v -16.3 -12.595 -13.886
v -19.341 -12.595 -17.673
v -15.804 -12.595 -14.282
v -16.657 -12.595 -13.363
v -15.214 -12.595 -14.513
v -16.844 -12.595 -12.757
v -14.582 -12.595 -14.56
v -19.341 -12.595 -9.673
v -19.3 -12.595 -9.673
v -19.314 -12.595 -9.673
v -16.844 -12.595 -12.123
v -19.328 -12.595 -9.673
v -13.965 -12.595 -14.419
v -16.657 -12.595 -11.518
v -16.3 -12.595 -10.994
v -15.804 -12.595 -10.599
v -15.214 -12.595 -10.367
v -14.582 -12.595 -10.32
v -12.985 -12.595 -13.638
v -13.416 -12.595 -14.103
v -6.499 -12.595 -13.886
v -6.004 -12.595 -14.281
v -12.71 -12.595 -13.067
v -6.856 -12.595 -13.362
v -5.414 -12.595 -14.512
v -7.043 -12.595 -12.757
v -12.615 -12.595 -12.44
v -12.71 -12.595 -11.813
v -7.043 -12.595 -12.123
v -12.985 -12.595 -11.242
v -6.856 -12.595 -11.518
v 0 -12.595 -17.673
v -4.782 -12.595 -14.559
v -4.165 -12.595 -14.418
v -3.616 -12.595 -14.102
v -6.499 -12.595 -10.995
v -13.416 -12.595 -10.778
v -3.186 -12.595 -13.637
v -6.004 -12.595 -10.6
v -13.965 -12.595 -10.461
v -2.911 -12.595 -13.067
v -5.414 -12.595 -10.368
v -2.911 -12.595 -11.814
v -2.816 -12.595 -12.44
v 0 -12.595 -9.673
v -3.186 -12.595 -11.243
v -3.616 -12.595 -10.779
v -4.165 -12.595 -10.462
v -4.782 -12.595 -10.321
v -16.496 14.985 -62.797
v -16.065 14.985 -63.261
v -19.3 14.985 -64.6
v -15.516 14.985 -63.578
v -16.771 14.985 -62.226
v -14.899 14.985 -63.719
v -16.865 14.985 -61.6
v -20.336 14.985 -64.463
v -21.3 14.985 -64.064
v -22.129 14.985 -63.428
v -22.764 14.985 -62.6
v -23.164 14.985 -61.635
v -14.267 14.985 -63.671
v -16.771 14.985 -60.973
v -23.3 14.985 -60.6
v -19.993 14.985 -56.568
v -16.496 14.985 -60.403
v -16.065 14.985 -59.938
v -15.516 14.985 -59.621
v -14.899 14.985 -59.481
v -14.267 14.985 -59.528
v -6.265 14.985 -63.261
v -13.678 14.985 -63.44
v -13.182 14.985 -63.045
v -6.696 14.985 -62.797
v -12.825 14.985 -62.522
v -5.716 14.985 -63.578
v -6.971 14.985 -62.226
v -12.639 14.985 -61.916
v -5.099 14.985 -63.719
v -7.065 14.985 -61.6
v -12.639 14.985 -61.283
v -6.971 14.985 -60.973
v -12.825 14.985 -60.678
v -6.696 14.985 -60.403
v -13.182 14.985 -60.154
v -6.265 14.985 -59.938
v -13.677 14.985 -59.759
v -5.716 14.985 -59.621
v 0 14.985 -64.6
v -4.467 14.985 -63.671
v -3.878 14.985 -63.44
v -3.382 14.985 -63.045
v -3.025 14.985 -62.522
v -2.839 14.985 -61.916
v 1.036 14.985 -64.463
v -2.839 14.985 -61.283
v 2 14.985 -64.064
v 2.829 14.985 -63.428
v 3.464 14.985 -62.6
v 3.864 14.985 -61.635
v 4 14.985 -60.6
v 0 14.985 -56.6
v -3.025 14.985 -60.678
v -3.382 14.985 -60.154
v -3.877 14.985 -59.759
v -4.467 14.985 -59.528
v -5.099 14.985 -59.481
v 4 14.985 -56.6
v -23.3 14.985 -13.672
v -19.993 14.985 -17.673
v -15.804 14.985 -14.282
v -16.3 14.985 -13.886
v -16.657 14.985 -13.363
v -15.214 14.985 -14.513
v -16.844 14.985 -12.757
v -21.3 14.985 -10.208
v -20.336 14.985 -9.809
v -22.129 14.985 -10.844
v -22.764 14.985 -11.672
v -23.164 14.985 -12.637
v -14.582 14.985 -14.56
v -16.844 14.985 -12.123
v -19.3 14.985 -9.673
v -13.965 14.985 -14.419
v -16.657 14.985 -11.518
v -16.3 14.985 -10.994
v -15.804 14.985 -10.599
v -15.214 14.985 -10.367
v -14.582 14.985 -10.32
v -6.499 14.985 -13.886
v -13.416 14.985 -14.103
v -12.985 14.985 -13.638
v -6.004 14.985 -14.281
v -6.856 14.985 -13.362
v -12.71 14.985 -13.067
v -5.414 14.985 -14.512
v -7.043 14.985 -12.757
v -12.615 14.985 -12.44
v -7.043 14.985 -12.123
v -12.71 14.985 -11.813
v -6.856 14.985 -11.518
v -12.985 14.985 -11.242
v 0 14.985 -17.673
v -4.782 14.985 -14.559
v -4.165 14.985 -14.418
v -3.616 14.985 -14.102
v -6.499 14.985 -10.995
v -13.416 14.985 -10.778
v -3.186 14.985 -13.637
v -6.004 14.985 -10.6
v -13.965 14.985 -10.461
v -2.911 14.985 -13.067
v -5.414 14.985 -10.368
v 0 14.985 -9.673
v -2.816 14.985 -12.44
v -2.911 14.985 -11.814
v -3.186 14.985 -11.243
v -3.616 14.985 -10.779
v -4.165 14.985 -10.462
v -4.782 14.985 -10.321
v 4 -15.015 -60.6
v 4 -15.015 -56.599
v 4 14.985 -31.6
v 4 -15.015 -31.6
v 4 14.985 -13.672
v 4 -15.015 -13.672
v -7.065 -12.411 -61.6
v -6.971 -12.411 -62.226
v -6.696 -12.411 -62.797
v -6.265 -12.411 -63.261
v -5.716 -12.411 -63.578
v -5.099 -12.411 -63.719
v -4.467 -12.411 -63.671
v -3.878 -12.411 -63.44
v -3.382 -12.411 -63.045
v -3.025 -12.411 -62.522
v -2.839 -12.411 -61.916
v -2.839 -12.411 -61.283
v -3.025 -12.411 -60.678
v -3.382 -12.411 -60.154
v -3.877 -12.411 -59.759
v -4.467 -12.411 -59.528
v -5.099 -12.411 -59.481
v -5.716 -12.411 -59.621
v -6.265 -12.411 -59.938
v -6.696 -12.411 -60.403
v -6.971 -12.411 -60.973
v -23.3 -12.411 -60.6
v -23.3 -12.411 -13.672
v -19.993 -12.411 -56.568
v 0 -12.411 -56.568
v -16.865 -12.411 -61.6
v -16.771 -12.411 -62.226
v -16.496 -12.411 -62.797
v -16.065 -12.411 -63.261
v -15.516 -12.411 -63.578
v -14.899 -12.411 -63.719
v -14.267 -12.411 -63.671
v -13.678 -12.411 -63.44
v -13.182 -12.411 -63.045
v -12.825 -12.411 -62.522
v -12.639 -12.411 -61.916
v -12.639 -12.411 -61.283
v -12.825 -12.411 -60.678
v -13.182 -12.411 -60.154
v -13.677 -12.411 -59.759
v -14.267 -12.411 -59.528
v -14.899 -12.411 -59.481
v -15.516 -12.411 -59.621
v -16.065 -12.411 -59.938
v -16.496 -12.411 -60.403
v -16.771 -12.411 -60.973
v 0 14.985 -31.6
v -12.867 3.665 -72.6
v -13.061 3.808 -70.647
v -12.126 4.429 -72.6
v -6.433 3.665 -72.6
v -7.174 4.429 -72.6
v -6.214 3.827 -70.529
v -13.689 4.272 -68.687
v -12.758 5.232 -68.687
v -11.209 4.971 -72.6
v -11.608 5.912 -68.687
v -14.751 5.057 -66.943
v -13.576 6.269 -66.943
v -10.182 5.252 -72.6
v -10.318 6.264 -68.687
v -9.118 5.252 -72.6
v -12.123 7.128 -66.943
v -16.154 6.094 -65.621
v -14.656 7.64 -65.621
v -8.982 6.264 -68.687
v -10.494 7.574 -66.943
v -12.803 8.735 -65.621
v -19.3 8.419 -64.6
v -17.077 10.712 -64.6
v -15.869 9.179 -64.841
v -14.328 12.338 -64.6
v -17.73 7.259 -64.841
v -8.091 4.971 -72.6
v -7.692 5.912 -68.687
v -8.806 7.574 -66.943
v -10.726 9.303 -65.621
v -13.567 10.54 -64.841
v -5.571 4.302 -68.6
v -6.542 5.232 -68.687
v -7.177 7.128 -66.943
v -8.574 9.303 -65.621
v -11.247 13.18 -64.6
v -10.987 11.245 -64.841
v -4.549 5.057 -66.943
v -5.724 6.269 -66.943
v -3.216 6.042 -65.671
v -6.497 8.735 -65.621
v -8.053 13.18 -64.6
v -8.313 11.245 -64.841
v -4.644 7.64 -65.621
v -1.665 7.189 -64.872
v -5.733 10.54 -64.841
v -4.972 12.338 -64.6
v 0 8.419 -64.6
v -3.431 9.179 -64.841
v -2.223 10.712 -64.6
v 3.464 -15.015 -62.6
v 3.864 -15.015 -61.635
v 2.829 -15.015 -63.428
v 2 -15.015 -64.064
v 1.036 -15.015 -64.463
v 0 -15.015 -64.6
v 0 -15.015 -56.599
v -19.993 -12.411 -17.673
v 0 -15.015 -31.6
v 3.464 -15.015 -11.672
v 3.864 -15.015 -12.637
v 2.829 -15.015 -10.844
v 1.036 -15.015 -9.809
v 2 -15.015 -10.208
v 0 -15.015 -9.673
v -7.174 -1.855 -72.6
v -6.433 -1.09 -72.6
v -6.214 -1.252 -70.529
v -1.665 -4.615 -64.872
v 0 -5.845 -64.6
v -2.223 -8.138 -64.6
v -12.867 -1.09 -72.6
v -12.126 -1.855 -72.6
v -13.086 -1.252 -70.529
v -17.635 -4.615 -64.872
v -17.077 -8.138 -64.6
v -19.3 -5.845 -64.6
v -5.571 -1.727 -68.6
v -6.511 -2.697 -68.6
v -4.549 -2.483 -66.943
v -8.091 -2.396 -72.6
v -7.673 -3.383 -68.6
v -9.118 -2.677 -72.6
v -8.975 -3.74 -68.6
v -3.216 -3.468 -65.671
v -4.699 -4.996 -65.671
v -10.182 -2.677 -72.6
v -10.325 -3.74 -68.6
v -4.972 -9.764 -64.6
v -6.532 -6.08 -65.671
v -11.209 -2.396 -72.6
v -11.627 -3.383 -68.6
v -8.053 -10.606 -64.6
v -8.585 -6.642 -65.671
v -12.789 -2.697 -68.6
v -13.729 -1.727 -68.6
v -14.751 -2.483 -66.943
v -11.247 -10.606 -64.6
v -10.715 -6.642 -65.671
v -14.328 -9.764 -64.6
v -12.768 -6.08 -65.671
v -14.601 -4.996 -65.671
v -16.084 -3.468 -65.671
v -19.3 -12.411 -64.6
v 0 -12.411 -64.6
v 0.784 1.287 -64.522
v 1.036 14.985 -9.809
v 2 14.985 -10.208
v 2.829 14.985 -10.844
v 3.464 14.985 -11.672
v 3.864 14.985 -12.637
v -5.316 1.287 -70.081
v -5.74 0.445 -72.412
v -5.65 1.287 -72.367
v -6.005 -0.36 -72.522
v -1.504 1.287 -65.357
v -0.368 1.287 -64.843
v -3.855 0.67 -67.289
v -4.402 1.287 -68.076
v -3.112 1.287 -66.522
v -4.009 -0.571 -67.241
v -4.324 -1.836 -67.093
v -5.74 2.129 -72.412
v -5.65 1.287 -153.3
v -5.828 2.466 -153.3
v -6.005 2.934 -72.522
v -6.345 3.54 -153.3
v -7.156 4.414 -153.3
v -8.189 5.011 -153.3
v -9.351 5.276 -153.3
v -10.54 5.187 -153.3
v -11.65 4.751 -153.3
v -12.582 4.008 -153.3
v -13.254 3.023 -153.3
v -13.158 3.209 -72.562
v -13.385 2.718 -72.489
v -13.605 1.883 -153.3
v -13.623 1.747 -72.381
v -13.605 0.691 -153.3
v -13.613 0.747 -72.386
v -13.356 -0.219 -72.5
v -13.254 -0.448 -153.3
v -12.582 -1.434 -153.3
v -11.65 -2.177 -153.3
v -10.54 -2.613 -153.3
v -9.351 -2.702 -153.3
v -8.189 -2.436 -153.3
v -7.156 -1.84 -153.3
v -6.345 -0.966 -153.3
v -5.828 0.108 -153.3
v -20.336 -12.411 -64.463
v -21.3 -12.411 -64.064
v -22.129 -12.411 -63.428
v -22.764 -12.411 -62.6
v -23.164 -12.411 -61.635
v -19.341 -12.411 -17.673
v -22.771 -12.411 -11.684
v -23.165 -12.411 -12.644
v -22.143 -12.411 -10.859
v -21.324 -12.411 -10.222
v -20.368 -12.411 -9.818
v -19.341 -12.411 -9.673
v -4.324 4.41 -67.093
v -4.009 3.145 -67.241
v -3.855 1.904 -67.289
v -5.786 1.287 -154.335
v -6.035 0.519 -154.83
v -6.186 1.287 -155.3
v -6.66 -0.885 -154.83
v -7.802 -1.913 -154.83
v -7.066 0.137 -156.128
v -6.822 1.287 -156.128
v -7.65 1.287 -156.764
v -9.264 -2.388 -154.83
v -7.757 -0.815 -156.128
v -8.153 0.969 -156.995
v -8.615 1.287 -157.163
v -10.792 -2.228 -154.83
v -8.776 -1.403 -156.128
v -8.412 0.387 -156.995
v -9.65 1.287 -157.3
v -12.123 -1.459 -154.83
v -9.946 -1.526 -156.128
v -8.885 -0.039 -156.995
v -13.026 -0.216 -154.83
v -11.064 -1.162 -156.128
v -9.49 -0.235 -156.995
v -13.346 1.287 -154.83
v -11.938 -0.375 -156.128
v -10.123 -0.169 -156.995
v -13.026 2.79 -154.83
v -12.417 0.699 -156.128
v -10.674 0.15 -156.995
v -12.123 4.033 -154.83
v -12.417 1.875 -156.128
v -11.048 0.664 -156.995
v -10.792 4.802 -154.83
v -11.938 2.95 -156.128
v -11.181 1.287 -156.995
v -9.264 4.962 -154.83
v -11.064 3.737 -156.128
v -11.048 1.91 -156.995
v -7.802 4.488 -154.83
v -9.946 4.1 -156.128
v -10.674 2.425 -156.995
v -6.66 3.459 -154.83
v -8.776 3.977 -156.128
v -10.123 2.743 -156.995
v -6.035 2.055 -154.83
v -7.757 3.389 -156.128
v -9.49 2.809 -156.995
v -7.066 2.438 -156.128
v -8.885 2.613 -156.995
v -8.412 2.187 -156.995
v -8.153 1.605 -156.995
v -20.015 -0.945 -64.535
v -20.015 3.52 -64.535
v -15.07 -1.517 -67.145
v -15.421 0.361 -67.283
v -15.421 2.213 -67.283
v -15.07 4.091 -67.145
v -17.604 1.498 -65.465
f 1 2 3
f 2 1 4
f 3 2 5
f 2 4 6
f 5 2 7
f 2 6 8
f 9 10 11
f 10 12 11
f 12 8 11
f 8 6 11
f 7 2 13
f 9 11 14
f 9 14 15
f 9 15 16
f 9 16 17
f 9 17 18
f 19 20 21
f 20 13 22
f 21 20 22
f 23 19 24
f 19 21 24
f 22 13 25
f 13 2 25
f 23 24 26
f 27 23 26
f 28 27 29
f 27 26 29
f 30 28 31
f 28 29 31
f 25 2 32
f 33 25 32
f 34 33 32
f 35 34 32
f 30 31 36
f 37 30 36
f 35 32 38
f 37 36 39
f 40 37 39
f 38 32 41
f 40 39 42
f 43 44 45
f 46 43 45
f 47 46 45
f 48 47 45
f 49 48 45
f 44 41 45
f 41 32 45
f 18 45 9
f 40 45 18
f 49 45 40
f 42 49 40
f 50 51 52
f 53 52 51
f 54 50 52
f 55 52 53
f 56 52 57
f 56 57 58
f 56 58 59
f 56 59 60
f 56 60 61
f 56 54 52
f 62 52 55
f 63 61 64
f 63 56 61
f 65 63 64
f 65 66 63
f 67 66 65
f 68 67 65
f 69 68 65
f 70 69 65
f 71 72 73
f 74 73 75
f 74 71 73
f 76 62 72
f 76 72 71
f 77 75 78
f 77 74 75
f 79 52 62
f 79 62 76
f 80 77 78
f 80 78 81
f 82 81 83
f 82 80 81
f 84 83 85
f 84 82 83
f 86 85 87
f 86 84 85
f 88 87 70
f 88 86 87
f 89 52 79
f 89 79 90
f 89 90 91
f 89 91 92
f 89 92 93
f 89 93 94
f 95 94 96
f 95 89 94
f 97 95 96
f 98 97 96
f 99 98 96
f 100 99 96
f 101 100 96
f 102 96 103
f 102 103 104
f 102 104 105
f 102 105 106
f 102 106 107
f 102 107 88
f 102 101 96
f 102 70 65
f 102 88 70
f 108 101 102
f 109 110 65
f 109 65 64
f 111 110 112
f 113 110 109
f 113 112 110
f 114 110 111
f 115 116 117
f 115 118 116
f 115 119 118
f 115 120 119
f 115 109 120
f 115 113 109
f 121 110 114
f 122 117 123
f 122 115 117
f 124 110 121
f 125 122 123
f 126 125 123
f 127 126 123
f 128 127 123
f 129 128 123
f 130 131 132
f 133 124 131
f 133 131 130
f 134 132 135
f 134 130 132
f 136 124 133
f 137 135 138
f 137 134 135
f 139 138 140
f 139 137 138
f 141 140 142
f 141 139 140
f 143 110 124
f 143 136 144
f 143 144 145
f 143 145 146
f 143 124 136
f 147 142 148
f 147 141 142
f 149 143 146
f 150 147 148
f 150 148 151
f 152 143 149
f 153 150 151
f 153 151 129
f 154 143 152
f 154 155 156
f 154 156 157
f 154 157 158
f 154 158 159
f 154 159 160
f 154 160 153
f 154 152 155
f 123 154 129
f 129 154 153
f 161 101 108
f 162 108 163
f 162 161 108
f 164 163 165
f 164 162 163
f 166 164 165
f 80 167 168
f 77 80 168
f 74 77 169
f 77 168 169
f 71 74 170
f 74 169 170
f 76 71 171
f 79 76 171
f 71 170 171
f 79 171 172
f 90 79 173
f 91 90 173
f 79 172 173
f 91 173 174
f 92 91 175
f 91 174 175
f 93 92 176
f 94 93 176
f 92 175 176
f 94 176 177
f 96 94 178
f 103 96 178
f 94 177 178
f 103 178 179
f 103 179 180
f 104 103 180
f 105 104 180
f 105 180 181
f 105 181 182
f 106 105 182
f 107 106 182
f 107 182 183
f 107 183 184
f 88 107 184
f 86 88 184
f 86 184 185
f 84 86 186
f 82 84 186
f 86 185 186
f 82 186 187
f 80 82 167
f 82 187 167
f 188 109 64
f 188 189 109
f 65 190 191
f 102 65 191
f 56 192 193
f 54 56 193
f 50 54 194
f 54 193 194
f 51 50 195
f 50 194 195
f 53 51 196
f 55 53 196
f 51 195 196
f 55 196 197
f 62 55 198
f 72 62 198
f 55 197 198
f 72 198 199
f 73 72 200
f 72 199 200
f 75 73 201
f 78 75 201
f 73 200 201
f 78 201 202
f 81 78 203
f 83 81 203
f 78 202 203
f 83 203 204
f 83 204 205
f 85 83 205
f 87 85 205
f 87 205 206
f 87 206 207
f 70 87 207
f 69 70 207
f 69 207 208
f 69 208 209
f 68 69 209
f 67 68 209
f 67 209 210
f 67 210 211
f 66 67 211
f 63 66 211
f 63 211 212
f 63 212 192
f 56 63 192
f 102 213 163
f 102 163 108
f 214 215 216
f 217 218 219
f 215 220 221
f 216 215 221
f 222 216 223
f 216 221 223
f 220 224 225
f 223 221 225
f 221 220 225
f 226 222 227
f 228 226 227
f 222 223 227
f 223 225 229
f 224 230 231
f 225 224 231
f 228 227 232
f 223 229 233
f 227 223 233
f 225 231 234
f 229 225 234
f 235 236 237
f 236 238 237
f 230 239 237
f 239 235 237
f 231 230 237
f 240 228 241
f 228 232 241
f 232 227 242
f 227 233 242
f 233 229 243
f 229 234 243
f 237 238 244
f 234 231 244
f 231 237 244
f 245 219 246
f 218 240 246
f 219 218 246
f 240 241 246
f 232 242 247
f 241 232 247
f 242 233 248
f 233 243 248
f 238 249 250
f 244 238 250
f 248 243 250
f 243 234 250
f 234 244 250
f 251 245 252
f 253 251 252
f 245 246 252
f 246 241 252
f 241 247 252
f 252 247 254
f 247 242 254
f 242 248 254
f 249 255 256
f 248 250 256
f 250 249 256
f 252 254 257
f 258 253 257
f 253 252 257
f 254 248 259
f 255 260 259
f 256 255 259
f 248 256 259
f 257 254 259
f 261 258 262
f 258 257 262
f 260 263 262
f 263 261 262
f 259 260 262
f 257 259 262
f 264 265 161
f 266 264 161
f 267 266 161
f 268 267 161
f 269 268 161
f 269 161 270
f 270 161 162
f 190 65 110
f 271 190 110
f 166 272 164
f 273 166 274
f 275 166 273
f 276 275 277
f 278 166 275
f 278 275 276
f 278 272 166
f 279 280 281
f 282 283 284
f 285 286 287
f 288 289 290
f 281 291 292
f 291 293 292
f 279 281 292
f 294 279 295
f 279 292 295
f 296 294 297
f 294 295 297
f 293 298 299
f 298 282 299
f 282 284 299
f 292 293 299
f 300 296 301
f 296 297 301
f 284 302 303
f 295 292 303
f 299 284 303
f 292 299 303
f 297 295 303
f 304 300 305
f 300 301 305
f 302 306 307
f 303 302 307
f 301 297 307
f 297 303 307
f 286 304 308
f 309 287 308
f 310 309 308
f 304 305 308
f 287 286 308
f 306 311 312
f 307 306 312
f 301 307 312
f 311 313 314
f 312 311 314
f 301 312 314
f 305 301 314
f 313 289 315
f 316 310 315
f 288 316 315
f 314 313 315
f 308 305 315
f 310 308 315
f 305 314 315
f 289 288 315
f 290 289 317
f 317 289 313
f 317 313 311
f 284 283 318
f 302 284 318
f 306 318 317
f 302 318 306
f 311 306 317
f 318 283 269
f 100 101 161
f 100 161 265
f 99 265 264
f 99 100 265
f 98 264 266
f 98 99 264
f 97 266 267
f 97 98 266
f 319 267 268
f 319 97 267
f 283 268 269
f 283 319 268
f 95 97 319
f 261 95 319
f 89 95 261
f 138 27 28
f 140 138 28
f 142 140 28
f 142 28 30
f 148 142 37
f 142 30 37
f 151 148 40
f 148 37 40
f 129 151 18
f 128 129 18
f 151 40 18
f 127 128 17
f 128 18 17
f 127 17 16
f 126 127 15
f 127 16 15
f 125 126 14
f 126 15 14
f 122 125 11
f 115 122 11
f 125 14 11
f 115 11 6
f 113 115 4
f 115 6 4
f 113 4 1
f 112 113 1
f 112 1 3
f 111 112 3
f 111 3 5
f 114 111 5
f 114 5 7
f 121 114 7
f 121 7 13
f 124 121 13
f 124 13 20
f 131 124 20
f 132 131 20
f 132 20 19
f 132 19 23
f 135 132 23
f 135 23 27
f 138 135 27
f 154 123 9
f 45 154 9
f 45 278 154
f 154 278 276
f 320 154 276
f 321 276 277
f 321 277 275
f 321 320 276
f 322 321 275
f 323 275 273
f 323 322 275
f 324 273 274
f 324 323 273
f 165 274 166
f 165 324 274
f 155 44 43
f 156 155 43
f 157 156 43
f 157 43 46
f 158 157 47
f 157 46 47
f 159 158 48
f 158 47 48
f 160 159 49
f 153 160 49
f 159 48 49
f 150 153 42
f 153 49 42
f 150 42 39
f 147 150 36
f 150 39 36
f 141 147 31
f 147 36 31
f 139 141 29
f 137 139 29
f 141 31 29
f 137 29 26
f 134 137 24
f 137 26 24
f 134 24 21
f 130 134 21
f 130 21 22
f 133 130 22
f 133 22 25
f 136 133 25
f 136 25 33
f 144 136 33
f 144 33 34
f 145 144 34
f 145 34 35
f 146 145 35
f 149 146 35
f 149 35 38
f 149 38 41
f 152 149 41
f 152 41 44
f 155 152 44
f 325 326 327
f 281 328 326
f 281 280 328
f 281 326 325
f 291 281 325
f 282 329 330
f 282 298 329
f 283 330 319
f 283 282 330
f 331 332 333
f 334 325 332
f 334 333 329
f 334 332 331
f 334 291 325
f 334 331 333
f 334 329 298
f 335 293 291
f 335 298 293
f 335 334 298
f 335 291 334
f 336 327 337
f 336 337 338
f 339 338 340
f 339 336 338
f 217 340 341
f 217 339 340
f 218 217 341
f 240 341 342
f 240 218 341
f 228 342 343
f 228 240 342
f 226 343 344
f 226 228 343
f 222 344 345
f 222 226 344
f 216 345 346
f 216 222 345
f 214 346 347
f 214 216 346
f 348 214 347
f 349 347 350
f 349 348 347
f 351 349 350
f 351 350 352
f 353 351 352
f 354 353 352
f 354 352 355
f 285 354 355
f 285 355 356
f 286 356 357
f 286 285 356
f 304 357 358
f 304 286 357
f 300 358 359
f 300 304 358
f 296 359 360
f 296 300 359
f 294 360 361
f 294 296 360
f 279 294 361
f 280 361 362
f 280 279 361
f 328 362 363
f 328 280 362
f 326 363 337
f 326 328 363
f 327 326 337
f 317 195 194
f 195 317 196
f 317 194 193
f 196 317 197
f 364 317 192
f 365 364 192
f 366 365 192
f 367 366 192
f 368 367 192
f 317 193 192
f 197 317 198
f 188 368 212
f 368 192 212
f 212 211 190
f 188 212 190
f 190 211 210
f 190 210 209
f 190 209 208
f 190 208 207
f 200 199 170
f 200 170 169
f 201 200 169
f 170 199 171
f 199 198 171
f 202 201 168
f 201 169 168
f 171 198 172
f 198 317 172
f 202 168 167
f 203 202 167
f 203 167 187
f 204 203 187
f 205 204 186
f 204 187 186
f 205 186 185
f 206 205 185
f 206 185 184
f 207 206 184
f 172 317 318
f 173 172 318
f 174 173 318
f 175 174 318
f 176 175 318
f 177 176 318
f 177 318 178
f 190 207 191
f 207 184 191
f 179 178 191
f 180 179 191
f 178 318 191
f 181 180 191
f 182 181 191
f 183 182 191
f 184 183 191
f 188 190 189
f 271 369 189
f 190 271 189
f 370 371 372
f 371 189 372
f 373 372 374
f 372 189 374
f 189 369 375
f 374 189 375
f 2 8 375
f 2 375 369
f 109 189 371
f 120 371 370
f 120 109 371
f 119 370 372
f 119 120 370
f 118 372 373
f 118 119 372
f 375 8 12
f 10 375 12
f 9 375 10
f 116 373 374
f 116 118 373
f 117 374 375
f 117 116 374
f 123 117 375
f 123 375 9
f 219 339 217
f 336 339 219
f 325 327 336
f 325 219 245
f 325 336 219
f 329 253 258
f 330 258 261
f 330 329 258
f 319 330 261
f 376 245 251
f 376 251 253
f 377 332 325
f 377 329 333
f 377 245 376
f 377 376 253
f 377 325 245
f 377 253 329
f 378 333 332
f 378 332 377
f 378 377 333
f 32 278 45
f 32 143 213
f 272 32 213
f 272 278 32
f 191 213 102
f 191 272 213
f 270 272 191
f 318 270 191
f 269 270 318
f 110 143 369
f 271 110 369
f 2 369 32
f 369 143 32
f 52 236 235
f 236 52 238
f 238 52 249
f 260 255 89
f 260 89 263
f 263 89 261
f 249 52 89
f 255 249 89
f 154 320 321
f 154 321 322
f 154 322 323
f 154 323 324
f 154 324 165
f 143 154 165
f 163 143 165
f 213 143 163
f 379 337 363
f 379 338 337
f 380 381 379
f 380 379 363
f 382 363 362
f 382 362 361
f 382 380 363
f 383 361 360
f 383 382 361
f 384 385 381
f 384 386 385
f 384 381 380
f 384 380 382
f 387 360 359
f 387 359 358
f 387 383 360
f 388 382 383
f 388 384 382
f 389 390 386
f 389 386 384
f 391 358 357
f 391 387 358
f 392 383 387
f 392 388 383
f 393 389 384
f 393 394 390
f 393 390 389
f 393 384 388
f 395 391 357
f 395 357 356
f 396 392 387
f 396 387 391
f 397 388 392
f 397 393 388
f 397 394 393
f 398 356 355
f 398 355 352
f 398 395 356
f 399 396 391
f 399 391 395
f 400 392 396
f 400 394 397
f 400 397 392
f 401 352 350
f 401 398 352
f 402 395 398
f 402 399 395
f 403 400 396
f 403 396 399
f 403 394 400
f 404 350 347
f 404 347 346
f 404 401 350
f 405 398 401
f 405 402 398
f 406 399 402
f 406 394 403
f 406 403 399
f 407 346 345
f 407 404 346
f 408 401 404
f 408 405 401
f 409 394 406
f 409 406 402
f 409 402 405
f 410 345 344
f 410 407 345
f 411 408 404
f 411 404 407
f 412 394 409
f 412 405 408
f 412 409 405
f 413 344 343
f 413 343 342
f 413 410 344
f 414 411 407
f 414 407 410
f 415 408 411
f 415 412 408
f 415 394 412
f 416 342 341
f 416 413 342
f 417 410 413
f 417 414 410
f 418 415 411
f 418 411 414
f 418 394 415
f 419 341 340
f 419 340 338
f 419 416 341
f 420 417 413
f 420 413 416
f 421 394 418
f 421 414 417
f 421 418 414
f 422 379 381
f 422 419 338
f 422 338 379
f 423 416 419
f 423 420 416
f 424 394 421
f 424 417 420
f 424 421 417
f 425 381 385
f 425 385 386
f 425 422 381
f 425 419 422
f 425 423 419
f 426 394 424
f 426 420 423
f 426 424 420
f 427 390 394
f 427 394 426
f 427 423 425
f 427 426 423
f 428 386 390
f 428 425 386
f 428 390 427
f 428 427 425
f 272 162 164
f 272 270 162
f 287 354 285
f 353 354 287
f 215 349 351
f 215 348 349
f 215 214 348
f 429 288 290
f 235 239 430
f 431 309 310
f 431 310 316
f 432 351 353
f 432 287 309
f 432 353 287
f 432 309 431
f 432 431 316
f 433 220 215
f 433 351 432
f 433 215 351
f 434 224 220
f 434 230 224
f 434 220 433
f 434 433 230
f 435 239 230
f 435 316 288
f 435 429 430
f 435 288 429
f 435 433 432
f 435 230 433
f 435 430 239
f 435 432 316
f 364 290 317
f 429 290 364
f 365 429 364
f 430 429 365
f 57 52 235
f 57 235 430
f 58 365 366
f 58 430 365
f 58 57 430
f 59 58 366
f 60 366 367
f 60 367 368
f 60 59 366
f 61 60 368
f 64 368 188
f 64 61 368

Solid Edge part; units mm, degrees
sketch "Sketch1" plane through (0, 0, 0) normal (1, 0, 0) x (0, 1, 0)
  circle A0 centre (0, 0) radius 4
  circle A1 centre (0, -63.2) radius 4
  line L0 (-15.0147, -31.5995) -> (-15.0147, -6.5995)
  arc A2 (-15.0147, -6.5995) -> (0, 7.9) centre (-0.023, -7.1) cw
  arc A3 (14.9853, -6.2691) -> (0, 7.9) centre (0.0083, -7.1) ccw
  line L1 (14.9853, -6.2691) -> (14.9853, -31.6)
  line L2 (14.9853, -31.6) -> (14.9853, -56.5995)
  arc A4 (-0.023, -71.0991) -> (14.9853, -56.5995) centre (-0.0063, -56.0991) ccw
  arc A5 (-15.0147, -56.5995) -> (-0.023, -71.0991) centre (-0.023, -56.0991) ccw
  line L3 (-15.0147, -56.5995) -> (-15.0147, -31.5995)
extrude "Protrusion1" add sketch "Sketch1" along normal blind 5
sketch "Sketch2" plane through (0, -0.0147, -31.5996) normal (-1, 0, 0) x (0, 0, -1)
  arc A0 (24.9999, 15) -> (24.9999, -15) centre (24.4909, 0) cw
  line L0 (24.9999, -15) -> (24.9999, -12)
  arc A1 (24.9999, 12) -> (24.9999, -12) centre (24.9999, 0) cw
  line L1 (24.9999, 15) -> (24.9999, 12)
extrude "ProtrusiónExtruida_2" add sketch "Sketch2" along normal blind 38
fillet "Redondeo_1" [suppressed]
sketch "Sketch3" plane through (5, -0.0147, -31.5996) normal (1, 0, 0) x (0, 0, -1)
  line L0 (24.9999, -15) -> (24.9999, 15)
  line L1 (24.9999, 15) -> (42.4193, 14.4186)
  line L2 (42.4193, 14.4186) -> (42.4193, -15)
  line L3 (42.4193, -15) -> (24.9999, -15)
extrude "VaciadoExtruido_1" cut sketch "Sketch3" against normal blind 80.5935
sketch "Sketch4" plane through (5, -0.0147, -24.3497) normal (1, 0, 0) x (0, 1, 0)
  line L0 (-15, 17.7502) -> (15.229, 17.7502)
  line L1 (15.229, 17.7502) -> (15.229, 38.738)
  line L2 (15.229, 38.738) -> (-15, 38.738)
  line L3 (-15, 38.738) -> (-15, 17.7502)
extrude "VaciadoExtruido_2" cut sketch "Sketch4" against normal blind 66.5304
sketch "Sketch5" plane through (0, -0.0147, -31.5995) normal (-1, 0, 0) x (0, -1, 0)
  line L0 (-15, 13.9269) -> (12.58, 13.9269)
  line L1 (12.58, 13.9269) -> (12.58, 21.9269)
  line L2 (12.58, 21.9269) -> (-15, 21.9269)
  line L3 (-15, 13.9269) -> (-15, 21.9269)
extrude "ProtrusiónExtruida_4" add sketch "Sketch5" along normal blind 19.3413
sketch "Sketch6" plane through (-9.6707, -12.5947, -13.6726) normal (0, -1, 0) x (1, 0, 0)
  circle A0 centre (-5.0706, 1.2324) radius 2.1262
  circle A1 centre (4.7294, 1.2324) radius 2.125
extrude "VaciadoExtruido_3" cut sketch "Sketch6" against normal blind 36.3882
sketch "Sketch7" plane through (5, -0.0147, -31.5995) normal (1, 0, 0) x (0, -1, 0)
  line L0 (15, 25) -> (-15, 25)
  line L1 (-15, 25) -> (-15, 33)
  line L2 (-15, 33) -> (15, 33)
  line L3 (15, 33) -> (15, 25)
extrude "Protrusion2" add sketch "Sketch7" against normal up to vertex (5 mm away)
sketch "Sketch8" plane through (-7.1707, 14.9853, -35.5995) normal (0, 1, 0) x (1, 0, 0)
  line L0 (-17.1293, -25.9269) -> (-12.1707, -25.9269)
  line L1 (-17.1293, -25.9269) -> (-17.1293, 29)
  line L2 (12.1707, 29) -> (-17.1293, 29)
  line L3 (12.1707, 20.9686) -> (12.1707, 29)
  line L4 (-12.8224, 20.9686) -> (12.1707, 20.9686)
  line L5 (-12.8224, 20.9686) -> (-12.8224, -17.9269)
  line L6 (-12.1707, -17.9269) -> (-12.8224, -17.9269)
  line L7 (-12.1707, -25.9269) -> (-12.1707, -17.9269)
extrude "ProtrusiónExtruida_6" add sketch "Sketch8" against normal blind 27.3963
sketch "Sketch9" plane through (-12.15, -12.411, -37.1361) normal (0, -1, 0) x (-1, 0, 0)
  circle A0 centre (2.59, 24.4635) radius 2.125
  circle A1 centre (-7.21, 24.4635) radius 2.125
extrude "VaciadoExtruido_4" cut sketch "Sketch9" against normal blind 76.7204
sketch "Sketch10" plane through (0, -0.0147, -35.5995) normal (-1, 0, 0) x (0, 0, -1)
  line L0 (-29, -15) -> (-25.9269, -15)
  line L1 (-25.9269, -15) -> (-25.9269, 15)
  line L2 (-25.9269, 15) -> (-29, 15)
  line L3 (-29, 15) -> (-29, -15)
extrude "VaciadoExtruido_5" cut sketch "Sketch10" against normal blind 44.1991
sketch "Sketch11" plane through (2.5, -15.0147, -37.1361) normal (0, -1, 0) x (0, 0, -1)
  line L0 (-27.4635, 2.5) -> (27.4635, 2.5)
  line L1 (27.4635, 2.5) -> (27.4635, 1.5)
  line L2 (27.4635, 1.5) -> (-27.4635, 1.5)
  line L3 (-27.4635, 1.5) -> (-27.4635, 2.5)
  line L4 (27.4635, -26.8) -> (-27.4635, -26.8)
  line L5 (-27.4635, -26.8) -> (-27.4635, -25.8)
  line L6 (-27.4635, -25.8) -> (27.4635, -25.8)
  line L7 (27.4635, -25.8) -> (27.4635, -26.8)
extrude "VaciadoExtruido_6" cut sketch "Sketch11" against normal blind 65.6283
fillet "Redondeo_2" radius 4 4 edges at (-23.3, 1.2871, -64.5995) (4, -0.0147, -64.5995) (-23.3, 1.2871, -9.6726) (4, -0.0147, -9.6726)
sketch "Sketch12" plane through (-9.65, 1.2871, -64.5995) normal (0, 0, -1) x (1, 0, 0)
  circle A0 centre (0, 0) radius 4
extrude "ProtrusiónExtruida_7" add sketch "Sketch12" along normal blind 92.7
fillet "Redondeo_3" radius 4 1 edges at (-13.65, 1.2871, -157.2995)
fillet "Redondeo_4" radius 8 1 edges at (-13.65, 1.2871, -64.5995)
properties material "Aluminum Alloy:3.0505 , AlMn0.5Mg0.6,  EN-AW 3105"
